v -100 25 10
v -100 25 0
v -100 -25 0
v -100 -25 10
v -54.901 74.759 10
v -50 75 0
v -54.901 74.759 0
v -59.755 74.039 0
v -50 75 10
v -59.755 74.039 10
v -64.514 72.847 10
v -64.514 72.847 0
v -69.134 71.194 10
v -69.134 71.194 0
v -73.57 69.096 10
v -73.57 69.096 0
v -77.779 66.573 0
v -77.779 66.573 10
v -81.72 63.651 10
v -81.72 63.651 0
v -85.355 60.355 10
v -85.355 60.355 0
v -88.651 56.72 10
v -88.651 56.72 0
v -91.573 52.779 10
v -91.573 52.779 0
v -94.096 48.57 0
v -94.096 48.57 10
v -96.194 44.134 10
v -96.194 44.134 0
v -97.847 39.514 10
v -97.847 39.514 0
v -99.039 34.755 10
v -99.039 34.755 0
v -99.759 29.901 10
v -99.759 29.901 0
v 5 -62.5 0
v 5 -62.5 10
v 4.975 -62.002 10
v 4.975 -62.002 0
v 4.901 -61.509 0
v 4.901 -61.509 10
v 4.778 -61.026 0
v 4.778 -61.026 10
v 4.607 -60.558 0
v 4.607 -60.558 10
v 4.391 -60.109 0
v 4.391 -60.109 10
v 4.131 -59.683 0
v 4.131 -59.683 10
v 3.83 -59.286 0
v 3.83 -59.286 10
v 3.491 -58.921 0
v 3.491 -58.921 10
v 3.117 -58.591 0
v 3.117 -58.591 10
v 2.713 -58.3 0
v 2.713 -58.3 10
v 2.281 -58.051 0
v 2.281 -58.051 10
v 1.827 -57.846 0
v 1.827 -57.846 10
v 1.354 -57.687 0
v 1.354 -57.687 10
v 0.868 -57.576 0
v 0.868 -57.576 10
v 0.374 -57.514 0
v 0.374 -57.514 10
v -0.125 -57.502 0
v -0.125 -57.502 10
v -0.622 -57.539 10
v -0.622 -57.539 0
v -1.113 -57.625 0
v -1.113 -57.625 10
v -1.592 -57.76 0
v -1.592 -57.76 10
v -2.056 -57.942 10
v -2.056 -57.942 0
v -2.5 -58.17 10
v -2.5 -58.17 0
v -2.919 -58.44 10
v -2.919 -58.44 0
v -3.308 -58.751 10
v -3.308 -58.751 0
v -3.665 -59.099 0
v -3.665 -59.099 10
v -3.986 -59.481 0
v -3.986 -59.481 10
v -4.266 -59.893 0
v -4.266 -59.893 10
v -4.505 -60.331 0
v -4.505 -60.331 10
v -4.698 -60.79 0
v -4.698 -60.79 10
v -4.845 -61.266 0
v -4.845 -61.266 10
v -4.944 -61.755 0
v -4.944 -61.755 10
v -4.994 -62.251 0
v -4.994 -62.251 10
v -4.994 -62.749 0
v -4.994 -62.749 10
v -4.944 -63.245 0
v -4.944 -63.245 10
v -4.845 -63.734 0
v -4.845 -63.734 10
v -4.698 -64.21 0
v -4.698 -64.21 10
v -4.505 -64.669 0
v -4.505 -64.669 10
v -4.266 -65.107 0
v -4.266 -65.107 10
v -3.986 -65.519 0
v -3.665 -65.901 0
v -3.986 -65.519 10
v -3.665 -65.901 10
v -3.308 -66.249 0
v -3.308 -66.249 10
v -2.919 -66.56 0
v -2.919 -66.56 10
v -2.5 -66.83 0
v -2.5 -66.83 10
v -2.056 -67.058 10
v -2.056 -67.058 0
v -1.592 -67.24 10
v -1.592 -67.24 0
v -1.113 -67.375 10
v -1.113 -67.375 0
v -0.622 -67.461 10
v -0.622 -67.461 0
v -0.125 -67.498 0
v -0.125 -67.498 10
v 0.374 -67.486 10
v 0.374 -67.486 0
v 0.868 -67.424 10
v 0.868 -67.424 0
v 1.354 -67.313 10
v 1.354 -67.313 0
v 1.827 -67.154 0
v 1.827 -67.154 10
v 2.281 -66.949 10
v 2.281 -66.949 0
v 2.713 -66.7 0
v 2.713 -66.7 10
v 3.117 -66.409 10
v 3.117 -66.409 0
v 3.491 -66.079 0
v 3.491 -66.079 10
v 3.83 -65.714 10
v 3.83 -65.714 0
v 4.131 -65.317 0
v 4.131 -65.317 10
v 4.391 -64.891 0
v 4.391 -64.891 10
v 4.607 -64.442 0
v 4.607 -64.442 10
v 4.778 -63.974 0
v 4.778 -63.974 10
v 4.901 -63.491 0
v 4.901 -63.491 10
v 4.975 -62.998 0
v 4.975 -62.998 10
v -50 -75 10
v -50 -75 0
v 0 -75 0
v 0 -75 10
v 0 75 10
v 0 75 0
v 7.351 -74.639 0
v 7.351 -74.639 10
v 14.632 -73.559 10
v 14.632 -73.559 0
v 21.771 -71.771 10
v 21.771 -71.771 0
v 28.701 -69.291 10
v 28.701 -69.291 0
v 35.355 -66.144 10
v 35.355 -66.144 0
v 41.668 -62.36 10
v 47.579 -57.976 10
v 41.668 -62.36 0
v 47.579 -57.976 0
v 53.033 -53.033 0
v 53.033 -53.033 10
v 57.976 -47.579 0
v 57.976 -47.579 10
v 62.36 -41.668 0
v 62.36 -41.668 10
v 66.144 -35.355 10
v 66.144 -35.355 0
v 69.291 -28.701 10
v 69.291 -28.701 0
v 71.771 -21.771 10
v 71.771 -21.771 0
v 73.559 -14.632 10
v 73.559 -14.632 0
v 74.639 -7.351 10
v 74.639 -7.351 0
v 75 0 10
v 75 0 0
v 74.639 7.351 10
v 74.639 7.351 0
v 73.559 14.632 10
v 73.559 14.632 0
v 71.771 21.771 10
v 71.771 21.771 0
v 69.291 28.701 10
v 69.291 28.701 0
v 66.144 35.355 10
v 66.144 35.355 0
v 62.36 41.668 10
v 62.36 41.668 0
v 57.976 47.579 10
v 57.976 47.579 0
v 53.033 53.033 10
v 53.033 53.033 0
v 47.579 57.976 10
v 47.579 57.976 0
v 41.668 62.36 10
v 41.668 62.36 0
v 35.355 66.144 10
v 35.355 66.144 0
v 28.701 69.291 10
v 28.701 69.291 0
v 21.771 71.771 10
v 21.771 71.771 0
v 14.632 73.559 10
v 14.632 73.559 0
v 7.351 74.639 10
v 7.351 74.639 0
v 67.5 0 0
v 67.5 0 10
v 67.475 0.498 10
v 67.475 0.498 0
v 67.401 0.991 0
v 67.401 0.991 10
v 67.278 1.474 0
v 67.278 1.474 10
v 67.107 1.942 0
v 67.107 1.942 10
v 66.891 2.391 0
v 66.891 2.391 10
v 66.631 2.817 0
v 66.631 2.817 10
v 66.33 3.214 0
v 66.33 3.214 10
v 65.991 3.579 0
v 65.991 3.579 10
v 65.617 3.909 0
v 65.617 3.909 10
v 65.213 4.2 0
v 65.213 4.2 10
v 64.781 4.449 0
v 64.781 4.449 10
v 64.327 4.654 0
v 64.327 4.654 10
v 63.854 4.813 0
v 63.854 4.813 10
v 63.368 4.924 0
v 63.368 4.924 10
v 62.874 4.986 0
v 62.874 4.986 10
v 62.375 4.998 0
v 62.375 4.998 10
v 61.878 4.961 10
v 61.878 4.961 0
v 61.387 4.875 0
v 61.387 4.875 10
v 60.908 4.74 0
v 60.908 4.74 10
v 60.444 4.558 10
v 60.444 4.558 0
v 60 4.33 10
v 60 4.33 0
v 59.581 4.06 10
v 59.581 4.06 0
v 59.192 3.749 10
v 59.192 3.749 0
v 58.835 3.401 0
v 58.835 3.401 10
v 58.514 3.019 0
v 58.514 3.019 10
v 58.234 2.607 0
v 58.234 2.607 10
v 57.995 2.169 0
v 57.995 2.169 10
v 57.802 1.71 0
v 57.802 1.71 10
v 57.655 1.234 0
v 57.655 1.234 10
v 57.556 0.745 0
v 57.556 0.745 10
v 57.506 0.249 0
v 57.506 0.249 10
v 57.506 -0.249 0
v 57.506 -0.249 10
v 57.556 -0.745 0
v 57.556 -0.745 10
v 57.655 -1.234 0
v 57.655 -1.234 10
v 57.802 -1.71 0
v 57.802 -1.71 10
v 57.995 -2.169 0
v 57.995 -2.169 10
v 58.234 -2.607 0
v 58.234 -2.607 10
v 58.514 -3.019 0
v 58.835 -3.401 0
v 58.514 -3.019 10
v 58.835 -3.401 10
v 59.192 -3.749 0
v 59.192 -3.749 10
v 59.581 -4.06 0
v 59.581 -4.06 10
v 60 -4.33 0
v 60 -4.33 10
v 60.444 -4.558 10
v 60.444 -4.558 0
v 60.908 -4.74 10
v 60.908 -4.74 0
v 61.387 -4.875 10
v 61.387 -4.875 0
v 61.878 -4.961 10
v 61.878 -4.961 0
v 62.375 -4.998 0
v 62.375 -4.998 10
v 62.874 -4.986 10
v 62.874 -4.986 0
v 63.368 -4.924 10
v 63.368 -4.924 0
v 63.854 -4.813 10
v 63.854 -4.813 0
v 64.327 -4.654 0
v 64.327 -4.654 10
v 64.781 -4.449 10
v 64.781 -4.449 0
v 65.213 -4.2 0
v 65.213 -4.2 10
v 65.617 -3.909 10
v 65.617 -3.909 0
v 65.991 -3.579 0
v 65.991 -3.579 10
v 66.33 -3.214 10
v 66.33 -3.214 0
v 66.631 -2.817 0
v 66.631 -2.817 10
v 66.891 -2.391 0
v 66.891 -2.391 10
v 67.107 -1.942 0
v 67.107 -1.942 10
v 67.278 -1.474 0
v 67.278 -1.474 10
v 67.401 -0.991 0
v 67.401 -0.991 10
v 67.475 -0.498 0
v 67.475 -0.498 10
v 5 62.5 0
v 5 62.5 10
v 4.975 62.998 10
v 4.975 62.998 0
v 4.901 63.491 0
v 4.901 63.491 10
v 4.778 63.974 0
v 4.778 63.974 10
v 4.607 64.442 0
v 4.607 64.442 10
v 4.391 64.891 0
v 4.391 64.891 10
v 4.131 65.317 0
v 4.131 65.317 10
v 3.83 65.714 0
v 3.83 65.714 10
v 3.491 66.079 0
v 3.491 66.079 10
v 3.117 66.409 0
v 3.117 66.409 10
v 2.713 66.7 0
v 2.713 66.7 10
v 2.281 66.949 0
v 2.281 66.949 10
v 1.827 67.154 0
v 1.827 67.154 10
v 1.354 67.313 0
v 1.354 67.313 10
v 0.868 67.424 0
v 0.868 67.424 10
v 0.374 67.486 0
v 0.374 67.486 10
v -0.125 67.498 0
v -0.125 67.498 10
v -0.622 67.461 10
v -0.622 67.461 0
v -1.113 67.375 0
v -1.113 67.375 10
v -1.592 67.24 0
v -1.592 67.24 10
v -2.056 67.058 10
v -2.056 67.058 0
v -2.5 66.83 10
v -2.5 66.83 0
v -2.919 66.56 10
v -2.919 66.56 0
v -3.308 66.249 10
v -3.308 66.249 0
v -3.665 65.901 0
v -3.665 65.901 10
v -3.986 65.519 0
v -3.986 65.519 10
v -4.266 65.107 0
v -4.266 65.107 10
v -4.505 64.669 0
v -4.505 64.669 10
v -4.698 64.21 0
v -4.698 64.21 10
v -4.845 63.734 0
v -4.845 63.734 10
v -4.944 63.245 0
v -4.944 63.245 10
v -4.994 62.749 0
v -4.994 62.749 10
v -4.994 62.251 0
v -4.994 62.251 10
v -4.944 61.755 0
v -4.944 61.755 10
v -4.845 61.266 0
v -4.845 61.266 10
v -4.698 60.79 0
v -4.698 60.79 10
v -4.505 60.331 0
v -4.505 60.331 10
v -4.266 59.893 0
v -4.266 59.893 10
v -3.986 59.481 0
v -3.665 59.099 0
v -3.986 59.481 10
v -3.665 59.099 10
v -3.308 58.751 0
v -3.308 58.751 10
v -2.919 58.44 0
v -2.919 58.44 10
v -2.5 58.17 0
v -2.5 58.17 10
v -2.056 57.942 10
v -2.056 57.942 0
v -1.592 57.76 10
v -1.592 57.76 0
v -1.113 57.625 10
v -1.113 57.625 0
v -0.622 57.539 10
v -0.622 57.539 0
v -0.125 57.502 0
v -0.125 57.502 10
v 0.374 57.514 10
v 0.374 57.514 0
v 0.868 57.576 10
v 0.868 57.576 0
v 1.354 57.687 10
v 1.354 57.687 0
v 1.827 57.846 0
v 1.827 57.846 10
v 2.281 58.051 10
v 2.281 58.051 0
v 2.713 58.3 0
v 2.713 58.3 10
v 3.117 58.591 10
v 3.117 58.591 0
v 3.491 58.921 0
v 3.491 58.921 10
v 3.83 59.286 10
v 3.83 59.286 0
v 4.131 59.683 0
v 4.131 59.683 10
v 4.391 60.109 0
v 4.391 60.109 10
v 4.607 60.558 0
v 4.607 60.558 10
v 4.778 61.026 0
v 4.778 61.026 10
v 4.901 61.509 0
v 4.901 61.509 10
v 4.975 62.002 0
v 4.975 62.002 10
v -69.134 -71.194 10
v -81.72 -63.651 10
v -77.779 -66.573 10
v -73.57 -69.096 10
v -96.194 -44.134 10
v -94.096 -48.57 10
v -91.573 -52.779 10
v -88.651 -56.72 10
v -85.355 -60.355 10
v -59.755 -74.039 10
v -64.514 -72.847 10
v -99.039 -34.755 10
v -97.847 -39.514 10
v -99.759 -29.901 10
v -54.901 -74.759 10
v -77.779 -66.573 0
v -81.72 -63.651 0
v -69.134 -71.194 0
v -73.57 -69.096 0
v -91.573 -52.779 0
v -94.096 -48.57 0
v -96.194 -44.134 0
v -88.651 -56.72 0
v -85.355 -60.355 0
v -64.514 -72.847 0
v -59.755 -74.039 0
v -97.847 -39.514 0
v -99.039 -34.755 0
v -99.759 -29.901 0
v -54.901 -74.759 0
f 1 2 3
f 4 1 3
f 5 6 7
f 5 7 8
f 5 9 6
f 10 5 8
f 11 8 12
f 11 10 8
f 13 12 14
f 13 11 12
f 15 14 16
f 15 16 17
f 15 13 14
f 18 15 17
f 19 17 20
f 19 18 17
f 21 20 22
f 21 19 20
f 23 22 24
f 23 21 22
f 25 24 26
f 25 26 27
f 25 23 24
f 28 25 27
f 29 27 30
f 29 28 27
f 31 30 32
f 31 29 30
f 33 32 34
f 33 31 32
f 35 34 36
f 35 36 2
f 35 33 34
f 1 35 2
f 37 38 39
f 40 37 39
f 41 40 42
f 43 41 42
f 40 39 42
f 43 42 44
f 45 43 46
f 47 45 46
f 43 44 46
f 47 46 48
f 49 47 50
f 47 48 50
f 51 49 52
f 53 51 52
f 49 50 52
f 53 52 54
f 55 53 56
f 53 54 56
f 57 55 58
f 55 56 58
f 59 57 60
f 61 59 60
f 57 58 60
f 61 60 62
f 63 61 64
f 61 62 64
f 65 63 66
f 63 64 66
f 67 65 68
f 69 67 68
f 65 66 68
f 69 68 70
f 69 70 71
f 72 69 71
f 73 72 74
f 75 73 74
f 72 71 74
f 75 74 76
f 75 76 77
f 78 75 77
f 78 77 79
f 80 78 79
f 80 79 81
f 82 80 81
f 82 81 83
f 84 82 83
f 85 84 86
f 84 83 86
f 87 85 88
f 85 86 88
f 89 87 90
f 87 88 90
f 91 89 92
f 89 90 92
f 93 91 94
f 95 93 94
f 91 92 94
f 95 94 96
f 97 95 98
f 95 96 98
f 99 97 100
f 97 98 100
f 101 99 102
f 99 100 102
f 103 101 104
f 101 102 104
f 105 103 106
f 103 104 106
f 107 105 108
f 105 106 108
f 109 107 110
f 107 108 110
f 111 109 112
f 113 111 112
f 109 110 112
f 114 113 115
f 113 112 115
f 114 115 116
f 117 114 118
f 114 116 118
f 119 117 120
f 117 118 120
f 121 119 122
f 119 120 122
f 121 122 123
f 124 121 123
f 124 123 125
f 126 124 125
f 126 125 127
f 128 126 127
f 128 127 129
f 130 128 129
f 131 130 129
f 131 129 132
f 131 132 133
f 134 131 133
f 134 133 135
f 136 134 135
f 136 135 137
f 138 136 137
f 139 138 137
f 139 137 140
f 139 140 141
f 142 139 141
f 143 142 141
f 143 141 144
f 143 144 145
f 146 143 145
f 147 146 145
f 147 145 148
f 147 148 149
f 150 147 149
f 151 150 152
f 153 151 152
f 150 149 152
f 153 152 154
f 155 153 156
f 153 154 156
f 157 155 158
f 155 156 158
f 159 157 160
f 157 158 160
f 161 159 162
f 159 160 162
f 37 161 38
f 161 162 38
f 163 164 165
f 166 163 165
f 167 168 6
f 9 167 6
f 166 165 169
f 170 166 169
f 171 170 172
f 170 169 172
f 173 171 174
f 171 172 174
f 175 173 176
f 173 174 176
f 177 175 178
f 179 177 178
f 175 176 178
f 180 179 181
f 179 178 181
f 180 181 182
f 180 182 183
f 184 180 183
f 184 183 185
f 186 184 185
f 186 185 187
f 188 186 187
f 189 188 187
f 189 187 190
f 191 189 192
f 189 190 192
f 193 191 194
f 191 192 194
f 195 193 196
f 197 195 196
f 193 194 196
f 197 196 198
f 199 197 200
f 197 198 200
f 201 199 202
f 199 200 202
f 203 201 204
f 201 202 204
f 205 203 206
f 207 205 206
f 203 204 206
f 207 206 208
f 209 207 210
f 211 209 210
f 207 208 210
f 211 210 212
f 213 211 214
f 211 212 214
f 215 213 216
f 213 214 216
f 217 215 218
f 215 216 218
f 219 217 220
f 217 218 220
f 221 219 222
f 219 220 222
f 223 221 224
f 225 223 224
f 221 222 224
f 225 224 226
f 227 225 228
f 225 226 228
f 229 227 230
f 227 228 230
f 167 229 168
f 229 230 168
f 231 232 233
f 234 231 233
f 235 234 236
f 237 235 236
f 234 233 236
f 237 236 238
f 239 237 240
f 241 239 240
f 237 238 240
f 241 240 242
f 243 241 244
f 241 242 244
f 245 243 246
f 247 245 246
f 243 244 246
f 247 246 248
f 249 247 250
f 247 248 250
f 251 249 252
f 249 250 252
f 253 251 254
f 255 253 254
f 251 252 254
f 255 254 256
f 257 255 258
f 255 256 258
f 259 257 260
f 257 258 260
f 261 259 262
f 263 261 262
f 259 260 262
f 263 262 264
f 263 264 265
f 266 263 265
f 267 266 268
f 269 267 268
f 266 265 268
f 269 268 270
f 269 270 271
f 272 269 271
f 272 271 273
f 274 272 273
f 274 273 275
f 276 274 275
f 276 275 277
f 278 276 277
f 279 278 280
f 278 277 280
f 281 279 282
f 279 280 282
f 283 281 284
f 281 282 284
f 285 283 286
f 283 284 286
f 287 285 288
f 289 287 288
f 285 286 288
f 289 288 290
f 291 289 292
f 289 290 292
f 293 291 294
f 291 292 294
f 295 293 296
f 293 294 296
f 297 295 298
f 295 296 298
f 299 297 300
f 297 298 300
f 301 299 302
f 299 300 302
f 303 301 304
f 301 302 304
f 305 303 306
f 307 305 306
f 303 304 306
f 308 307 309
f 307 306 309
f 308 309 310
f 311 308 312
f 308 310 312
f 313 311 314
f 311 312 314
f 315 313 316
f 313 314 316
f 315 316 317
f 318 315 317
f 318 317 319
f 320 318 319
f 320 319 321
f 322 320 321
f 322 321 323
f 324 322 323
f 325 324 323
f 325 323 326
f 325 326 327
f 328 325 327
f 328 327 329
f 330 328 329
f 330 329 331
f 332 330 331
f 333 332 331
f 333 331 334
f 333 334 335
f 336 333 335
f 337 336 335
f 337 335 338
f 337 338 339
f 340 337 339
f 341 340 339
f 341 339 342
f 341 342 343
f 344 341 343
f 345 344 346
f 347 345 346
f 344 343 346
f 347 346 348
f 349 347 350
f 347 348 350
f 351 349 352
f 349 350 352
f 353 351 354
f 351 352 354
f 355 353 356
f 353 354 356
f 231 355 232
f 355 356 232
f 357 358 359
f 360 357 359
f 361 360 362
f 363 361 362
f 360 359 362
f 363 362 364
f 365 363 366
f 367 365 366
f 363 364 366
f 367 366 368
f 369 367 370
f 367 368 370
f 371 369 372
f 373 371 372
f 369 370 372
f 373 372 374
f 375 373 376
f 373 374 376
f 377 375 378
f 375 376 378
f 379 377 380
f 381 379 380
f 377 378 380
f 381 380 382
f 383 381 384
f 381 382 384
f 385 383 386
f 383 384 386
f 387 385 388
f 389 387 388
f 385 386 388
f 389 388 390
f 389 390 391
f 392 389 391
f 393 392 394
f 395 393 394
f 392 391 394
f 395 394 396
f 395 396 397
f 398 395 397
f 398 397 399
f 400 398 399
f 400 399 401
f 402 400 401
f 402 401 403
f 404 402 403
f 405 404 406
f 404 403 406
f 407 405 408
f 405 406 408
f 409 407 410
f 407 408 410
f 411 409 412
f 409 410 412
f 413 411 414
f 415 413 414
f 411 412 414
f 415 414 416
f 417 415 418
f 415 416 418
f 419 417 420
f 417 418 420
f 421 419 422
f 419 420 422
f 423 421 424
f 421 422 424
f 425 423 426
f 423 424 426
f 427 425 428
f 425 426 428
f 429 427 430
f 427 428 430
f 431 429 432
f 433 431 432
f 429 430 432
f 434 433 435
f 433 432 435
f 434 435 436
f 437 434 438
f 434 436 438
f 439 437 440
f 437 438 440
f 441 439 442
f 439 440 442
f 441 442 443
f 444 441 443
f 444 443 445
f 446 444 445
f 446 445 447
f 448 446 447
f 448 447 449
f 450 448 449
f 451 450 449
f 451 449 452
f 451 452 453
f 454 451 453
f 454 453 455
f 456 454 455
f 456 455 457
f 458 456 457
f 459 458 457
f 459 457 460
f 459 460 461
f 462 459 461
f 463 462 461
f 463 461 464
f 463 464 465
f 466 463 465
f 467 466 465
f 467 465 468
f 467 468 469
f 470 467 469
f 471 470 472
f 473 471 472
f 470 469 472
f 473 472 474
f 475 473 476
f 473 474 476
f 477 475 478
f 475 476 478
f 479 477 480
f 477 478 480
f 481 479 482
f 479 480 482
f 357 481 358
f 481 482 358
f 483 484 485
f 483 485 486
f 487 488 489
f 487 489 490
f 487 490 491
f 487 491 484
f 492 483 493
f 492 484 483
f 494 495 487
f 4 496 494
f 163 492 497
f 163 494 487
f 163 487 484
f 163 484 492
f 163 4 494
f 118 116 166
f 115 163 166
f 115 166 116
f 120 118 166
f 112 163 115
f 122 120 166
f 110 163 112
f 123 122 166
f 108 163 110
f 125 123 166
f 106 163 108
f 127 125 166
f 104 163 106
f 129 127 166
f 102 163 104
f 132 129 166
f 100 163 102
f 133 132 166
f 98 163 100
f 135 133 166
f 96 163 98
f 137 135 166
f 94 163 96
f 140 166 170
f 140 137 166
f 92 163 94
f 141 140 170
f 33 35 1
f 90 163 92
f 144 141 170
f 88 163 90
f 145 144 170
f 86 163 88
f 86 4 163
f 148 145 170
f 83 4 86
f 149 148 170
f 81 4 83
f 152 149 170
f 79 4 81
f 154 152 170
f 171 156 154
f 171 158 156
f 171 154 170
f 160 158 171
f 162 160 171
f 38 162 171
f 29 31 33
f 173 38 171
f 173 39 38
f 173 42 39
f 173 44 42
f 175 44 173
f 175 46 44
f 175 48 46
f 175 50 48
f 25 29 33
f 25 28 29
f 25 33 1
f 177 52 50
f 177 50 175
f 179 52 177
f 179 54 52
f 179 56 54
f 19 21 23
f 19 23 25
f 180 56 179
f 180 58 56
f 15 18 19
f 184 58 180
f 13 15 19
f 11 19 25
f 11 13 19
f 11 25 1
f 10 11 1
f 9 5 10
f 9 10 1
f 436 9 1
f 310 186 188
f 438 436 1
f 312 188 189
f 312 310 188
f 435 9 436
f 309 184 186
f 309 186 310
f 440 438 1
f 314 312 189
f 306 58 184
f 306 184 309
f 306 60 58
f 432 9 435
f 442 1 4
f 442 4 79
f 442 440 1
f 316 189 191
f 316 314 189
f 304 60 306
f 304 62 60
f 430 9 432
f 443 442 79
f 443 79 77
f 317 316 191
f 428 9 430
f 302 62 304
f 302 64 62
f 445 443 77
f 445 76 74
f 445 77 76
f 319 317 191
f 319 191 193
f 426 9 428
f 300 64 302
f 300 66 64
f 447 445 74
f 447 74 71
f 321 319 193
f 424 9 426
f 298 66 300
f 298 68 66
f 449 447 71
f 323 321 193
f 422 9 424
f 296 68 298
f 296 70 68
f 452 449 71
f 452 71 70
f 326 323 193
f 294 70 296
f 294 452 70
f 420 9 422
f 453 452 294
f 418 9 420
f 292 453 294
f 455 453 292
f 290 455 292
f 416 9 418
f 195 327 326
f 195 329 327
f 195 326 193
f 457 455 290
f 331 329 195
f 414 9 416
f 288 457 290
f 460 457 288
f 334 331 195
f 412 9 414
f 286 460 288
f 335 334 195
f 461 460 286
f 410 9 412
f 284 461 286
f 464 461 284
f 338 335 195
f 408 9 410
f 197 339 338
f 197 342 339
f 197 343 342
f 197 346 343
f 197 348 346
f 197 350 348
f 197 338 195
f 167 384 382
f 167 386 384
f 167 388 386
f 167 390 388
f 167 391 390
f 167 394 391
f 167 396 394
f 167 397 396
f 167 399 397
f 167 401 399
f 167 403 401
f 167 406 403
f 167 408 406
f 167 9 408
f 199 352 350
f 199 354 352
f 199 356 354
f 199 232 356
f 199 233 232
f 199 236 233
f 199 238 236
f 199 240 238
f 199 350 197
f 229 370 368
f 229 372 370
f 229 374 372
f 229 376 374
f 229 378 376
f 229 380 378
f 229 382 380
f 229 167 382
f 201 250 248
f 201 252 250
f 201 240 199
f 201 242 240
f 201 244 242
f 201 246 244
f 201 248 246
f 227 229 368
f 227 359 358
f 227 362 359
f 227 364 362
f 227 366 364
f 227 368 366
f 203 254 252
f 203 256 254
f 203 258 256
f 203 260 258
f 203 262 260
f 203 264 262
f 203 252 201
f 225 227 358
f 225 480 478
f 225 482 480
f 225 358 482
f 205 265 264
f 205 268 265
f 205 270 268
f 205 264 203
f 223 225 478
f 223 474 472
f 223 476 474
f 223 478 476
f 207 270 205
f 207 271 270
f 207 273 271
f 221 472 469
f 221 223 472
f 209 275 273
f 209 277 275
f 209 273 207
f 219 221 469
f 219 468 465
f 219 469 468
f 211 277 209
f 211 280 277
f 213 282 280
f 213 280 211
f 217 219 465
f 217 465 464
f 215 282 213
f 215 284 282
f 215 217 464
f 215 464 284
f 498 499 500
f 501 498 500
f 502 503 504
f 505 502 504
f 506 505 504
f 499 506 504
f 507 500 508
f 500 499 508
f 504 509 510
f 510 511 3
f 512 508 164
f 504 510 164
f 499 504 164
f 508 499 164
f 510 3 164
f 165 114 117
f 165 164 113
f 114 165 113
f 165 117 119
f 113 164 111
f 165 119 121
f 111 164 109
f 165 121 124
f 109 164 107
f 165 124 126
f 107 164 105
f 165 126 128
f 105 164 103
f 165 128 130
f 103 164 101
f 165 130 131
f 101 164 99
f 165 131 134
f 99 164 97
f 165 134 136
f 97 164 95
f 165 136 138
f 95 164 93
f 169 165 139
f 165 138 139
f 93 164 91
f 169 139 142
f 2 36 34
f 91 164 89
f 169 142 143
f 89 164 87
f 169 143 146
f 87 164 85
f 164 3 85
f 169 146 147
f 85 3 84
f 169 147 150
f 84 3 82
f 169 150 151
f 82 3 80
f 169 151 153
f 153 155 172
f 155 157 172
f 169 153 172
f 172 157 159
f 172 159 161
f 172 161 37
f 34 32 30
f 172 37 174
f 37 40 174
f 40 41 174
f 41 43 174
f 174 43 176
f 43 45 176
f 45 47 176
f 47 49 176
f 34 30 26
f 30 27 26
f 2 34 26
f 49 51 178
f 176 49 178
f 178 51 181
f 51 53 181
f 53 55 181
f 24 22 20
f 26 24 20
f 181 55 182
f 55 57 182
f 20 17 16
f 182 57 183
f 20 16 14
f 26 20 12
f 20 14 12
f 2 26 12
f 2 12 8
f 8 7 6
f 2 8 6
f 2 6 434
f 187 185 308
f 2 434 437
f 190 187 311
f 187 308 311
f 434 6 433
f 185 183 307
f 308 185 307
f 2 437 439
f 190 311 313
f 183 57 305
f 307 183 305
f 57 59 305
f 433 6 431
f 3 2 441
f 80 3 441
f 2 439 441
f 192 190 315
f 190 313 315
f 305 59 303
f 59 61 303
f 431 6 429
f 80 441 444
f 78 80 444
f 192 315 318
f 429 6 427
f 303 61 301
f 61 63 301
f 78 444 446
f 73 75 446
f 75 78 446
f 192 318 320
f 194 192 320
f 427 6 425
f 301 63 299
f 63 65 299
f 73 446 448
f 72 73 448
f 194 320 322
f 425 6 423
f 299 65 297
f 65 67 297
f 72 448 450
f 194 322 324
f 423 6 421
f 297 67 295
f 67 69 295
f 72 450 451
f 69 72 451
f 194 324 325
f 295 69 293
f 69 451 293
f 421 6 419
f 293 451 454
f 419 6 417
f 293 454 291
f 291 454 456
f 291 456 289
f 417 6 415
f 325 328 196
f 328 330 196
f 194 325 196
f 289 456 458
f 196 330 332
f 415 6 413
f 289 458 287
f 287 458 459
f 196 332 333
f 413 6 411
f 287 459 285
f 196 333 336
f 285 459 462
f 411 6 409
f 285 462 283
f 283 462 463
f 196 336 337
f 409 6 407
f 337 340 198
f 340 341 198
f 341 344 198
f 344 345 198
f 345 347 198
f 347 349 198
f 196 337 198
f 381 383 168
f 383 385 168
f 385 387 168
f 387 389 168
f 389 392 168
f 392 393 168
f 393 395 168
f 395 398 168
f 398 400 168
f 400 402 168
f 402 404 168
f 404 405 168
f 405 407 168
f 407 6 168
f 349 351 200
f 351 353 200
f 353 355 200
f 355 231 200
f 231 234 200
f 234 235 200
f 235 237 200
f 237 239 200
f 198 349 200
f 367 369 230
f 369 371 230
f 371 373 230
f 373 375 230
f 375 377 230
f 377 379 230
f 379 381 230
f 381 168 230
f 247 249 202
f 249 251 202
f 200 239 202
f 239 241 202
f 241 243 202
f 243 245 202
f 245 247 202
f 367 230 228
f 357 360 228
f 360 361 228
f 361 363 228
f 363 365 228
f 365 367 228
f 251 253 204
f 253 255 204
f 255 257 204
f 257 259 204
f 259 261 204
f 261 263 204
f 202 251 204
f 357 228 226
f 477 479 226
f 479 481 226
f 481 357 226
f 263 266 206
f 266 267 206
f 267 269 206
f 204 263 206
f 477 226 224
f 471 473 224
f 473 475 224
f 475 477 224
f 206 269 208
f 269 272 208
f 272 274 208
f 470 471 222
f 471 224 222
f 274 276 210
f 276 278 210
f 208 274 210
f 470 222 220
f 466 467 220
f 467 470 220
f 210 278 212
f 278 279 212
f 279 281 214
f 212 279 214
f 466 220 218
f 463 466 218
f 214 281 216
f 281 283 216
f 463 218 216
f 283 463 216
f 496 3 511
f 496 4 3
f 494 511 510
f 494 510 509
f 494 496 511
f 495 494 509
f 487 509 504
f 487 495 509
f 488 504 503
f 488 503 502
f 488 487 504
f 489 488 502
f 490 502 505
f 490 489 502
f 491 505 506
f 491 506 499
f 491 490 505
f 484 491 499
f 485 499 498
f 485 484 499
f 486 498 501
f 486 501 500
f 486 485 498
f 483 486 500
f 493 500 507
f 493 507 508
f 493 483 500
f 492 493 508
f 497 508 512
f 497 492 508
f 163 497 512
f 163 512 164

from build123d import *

# Parameters (mm, degrees)
BOSS_EXTRUDE1_DEPTH = 10
SKETCH2_R           = 5
CUT_EXTRUDE1_DEPTH  = 10
FILLET1_R           = 50


with BuildPart() as part:
    # Sketch1 → Boss-Extrude1 (new body)
    with BuildSketch(Plane.XY):
        with BuildLine():
            Line((0, 75), (-100, 75))
            Line((-100, 75), (-100, -75))
            Line((-100, -75), (0, -75))
            ThreePointArc((0, -75), (75, 0), (0, 75))
        make_face()
    extrude(amount=BOSS_EXTRUDE1_DEPTH)

    # Sketch2 → Cut-Extrude1 (cut)
    with BuildSketch(Plane.XY.offset(10)):
        with Locations((0, 62.5)):
            Circle(SKETCH2_R)
        with Locations((62.5, 0)):
            Circle(SKETCH2_R)
        with Locations((0, -62.5)):
            Circle(SKETCH2_R)
    extrude(amount=-CUT_EXTRUDE1_DEPTH, mode=Mode.SUBTRACT)

    # Fillet1
    fillet1_edges = [part.edges().sort_by_distance(p)[0] for p in [
        (-100, -75, 5),
        (-100, 75, 5),
    ]]
    fillet(fillet1_edges, radius=FILLET1_R)


solid = part.part
